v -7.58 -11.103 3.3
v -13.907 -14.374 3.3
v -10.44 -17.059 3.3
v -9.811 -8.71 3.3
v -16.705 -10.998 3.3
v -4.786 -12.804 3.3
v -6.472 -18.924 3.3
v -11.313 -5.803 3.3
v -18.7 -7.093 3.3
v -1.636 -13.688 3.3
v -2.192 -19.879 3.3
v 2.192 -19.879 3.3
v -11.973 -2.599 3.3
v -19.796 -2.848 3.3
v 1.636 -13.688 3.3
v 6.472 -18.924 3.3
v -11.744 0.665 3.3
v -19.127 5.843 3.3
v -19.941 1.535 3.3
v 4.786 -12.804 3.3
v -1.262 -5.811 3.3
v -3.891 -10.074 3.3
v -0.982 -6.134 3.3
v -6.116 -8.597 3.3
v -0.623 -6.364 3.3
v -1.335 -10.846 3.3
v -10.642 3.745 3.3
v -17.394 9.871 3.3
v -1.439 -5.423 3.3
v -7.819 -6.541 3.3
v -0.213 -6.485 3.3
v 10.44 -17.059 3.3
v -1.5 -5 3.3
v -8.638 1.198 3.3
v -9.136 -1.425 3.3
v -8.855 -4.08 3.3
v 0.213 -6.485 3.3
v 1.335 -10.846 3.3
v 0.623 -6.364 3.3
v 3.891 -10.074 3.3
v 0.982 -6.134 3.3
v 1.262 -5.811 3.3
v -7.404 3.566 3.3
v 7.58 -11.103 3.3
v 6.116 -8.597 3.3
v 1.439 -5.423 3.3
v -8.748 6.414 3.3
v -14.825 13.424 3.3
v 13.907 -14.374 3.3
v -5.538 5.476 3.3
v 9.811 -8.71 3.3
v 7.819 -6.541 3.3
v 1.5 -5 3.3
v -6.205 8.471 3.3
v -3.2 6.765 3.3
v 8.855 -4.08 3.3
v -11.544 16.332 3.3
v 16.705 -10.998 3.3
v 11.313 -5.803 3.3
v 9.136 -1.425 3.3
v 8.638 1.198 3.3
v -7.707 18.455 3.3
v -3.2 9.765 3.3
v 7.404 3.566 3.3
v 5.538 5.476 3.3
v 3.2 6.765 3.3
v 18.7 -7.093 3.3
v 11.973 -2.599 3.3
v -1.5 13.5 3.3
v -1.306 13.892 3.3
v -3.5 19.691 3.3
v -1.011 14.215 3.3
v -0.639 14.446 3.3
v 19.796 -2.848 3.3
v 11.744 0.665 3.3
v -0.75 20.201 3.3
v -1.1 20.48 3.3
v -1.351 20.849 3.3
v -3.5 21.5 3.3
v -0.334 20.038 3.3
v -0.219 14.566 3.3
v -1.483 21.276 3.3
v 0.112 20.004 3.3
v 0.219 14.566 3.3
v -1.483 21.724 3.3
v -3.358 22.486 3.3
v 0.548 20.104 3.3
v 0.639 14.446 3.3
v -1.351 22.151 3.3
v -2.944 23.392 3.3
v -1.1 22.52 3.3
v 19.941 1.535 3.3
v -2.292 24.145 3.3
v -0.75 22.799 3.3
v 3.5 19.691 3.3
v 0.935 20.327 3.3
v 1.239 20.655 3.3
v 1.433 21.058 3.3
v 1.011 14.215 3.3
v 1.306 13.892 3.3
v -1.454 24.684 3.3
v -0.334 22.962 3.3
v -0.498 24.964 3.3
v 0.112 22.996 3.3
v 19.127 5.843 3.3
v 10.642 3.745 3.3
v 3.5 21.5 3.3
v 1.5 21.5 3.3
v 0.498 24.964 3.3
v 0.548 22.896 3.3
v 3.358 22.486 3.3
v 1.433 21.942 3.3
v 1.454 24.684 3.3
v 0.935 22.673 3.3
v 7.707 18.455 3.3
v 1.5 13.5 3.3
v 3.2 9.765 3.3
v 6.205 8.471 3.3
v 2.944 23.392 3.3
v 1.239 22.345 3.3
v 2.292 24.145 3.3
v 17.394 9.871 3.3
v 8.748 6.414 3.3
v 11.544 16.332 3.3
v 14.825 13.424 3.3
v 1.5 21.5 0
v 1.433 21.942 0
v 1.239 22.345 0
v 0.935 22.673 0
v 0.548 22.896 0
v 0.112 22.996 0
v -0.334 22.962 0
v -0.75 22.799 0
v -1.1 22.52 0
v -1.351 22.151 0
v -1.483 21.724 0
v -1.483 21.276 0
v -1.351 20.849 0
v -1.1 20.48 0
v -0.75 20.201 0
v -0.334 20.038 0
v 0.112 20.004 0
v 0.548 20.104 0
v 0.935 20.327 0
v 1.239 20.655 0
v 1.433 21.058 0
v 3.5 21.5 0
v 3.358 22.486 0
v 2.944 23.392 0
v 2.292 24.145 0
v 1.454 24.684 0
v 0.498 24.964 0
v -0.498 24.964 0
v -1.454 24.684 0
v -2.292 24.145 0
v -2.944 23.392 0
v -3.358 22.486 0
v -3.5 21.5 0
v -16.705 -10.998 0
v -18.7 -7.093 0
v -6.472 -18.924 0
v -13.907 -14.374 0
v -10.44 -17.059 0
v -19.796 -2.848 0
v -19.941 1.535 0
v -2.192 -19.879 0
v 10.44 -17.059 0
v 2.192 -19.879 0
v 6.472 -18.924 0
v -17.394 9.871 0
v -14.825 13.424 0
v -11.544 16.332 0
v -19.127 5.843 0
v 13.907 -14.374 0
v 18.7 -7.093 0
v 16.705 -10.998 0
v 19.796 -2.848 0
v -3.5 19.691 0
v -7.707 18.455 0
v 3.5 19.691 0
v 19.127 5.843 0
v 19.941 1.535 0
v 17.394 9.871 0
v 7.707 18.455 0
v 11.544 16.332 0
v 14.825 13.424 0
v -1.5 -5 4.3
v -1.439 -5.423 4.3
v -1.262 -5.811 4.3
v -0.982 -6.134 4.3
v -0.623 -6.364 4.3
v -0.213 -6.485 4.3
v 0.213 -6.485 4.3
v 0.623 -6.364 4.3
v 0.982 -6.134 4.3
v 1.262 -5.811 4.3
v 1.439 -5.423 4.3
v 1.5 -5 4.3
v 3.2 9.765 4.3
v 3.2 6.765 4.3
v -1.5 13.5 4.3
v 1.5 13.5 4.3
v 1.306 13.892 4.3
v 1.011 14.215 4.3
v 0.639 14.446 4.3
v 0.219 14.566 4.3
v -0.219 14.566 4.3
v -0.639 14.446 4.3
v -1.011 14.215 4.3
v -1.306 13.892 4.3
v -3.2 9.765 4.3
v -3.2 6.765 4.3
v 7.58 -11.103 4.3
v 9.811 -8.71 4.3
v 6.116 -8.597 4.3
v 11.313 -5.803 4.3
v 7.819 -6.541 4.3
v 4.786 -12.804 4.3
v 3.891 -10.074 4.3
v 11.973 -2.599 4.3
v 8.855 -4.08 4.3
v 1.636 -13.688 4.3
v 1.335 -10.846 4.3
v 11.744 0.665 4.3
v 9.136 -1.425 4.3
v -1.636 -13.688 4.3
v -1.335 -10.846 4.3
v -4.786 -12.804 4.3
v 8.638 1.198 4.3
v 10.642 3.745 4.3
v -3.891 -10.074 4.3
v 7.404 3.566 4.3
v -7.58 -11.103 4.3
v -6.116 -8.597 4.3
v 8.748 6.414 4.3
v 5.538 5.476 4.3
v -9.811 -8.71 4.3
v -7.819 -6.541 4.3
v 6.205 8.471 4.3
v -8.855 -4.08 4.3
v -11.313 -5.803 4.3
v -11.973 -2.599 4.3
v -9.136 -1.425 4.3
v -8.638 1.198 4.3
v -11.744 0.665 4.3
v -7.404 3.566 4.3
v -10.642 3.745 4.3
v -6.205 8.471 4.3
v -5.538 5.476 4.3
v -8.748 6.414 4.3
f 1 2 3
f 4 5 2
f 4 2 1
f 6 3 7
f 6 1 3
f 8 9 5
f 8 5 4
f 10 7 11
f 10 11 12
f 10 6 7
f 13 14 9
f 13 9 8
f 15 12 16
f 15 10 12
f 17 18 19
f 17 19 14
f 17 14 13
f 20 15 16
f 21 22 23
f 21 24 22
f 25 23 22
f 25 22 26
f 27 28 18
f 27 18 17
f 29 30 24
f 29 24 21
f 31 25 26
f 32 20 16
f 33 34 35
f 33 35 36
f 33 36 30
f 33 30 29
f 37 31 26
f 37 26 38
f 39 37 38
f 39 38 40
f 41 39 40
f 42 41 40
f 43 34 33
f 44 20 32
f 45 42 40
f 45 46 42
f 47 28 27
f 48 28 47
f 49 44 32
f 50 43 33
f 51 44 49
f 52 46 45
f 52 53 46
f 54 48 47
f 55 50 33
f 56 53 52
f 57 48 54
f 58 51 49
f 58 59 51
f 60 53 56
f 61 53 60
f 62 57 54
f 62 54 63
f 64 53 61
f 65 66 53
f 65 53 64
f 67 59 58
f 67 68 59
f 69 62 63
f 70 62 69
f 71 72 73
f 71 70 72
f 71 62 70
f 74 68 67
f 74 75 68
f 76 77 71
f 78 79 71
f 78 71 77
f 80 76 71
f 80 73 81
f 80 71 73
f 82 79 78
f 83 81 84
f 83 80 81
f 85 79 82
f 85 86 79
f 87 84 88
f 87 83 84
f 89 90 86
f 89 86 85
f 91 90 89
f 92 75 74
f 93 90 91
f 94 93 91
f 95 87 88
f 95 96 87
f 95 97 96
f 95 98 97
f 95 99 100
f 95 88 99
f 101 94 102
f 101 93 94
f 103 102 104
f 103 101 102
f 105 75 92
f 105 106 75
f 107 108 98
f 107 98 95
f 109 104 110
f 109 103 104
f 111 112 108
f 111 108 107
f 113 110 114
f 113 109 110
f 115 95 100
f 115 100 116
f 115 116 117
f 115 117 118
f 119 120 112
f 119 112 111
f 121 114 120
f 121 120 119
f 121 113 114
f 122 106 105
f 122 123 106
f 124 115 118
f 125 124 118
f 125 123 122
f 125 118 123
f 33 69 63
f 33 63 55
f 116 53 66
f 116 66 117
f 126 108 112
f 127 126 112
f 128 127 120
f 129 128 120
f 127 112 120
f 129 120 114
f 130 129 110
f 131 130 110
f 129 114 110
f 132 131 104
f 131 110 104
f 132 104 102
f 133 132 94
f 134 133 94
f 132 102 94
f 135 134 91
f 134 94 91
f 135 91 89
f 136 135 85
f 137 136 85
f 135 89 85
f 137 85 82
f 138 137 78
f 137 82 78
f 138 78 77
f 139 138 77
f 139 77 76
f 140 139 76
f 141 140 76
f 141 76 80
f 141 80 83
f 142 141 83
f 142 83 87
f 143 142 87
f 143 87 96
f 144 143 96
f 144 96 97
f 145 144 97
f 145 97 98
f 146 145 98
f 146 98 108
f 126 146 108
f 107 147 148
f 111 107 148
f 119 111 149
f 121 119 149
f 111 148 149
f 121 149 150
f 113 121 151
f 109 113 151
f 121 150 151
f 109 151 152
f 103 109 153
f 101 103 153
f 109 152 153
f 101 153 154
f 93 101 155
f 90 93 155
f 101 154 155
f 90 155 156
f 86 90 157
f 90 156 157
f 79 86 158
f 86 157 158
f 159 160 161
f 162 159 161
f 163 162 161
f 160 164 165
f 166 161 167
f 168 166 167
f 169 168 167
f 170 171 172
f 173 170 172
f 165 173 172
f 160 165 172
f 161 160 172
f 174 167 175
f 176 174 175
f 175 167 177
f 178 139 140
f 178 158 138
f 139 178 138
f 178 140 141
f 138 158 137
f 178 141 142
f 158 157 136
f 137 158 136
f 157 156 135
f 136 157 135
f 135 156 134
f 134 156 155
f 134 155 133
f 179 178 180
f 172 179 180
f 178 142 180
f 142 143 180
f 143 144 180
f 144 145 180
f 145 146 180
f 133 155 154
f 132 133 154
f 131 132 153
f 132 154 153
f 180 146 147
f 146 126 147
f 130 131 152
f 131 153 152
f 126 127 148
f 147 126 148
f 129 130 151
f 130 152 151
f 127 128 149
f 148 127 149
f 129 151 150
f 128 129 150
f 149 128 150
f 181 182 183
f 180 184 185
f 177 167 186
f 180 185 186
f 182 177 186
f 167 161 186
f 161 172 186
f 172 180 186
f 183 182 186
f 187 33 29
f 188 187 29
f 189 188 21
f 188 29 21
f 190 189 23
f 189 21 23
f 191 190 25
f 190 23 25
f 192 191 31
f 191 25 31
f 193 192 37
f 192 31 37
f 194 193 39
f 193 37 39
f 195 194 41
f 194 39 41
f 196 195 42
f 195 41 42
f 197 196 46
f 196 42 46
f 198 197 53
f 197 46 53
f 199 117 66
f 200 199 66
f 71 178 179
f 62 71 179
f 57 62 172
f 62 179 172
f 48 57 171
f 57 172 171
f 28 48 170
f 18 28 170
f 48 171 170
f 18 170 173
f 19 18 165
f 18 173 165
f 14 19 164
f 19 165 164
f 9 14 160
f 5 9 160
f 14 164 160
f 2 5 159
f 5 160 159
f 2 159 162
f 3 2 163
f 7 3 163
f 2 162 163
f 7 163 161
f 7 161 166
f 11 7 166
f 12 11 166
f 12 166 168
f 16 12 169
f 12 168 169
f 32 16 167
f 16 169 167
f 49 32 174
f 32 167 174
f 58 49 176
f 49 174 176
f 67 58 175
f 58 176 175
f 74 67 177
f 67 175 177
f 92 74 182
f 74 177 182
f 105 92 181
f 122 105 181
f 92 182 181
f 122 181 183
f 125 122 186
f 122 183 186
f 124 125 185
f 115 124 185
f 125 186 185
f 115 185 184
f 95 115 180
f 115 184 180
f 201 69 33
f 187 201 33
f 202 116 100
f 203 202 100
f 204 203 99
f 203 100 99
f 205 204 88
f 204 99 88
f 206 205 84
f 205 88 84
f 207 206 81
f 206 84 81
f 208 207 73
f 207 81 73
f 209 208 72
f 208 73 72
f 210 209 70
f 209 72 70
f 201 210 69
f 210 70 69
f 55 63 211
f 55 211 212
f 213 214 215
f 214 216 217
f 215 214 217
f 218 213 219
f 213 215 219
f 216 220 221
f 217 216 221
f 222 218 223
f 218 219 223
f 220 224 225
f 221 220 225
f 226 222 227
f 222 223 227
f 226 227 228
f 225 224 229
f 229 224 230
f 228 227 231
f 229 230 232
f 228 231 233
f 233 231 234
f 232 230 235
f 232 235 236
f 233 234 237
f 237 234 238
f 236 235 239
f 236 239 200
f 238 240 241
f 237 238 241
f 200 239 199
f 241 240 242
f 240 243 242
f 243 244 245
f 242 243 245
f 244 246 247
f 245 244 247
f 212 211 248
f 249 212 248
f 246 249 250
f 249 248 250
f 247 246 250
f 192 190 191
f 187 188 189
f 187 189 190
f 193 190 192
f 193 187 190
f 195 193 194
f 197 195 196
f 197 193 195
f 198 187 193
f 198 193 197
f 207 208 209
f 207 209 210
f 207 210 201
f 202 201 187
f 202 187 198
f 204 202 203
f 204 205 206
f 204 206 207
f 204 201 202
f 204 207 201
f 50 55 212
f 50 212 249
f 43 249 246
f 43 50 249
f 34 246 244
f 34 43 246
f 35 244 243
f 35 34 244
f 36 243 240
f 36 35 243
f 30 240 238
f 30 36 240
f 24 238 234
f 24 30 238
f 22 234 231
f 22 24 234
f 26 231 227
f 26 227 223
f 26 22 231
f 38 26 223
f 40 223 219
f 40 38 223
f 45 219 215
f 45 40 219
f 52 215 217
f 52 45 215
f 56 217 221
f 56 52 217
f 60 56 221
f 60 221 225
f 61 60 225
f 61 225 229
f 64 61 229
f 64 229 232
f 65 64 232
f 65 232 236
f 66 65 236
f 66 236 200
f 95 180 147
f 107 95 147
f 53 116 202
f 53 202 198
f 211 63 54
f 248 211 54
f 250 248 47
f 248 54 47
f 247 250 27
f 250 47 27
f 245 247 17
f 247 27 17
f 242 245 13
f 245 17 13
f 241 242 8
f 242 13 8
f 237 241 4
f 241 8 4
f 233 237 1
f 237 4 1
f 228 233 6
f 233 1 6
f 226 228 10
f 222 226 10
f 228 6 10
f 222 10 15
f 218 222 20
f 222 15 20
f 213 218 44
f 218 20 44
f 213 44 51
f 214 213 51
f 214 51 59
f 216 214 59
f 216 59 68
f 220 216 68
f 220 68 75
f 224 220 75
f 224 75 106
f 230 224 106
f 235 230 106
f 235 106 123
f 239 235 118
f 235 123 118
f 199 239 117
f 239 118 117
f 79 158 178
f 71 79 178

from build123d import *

# Parameters (mm, degrees)
EXTRUDE_DEPTH = 3.3
SKETCH001_R   = 1.5
POCKET_DEPTH  = 3.301
PAD_DEPTH     = 1


with BuildPart() as part:
    # Sketch → Extrude (new body)
    with BuildSketch(Plane.XY):
        with BuildLine():
            ThreePointArc((3.5, 21.5), (0, 25), (-3.5, 21.5))
            Line((-3.5, 21.5), (-3.5, 19.691369))
            ThreePointArc((-3.5, 19.691369), (0, -20), (3.5, 19.691369))
            Line((3.5, 19.691369), (3.5, 21.5))
        make_face()
    extrude(amount=EXTRUDE_DEPTH)

    # Sketch001 (on Face6 of Extrude) → Pocket (cut, through all)
    with BuildSketch(Plane.XY.offset(3.3)):
        with Locations((0, 21.5)):
            Circle(SKETCH001_R)
    extrude(amount=-POCKET_DEPTH, mode=Mode.SUBTRACT)

    # Sketch002 (on Face1 of CopyClone) → Pad (join)
    with BuildSketch(Plane.XY.offset(3.3)):
        with BuildLine():
            Line((-1.5, 13.5), (-1.5, -5))
            ThreePointArc((-1.5, -5), (0, -6.5), (1.5, -5))
            Line((1.5, 13.5), (1.5, -5))
            ThreePointArc((1.5, 13.5), (0, 14.581139), (-1.5, 13.5))
        make_face()
        with BuildLine():
            Line((-3.2, 9.765466), (-3.2, 6.765466))
            ThreePointArc((-3.2, 6.765466), (0, -10.943698), (3.2, 6.765466))
            Line((3.2, 9.765466), (3.2, 6.765466))
            ThreePointArc((-3.2, 9.765466), (0, -13.8), (3.2, 9.765466))
        make_face()
    extrude(amount=PAD_DEPTH)


solid = part.part
